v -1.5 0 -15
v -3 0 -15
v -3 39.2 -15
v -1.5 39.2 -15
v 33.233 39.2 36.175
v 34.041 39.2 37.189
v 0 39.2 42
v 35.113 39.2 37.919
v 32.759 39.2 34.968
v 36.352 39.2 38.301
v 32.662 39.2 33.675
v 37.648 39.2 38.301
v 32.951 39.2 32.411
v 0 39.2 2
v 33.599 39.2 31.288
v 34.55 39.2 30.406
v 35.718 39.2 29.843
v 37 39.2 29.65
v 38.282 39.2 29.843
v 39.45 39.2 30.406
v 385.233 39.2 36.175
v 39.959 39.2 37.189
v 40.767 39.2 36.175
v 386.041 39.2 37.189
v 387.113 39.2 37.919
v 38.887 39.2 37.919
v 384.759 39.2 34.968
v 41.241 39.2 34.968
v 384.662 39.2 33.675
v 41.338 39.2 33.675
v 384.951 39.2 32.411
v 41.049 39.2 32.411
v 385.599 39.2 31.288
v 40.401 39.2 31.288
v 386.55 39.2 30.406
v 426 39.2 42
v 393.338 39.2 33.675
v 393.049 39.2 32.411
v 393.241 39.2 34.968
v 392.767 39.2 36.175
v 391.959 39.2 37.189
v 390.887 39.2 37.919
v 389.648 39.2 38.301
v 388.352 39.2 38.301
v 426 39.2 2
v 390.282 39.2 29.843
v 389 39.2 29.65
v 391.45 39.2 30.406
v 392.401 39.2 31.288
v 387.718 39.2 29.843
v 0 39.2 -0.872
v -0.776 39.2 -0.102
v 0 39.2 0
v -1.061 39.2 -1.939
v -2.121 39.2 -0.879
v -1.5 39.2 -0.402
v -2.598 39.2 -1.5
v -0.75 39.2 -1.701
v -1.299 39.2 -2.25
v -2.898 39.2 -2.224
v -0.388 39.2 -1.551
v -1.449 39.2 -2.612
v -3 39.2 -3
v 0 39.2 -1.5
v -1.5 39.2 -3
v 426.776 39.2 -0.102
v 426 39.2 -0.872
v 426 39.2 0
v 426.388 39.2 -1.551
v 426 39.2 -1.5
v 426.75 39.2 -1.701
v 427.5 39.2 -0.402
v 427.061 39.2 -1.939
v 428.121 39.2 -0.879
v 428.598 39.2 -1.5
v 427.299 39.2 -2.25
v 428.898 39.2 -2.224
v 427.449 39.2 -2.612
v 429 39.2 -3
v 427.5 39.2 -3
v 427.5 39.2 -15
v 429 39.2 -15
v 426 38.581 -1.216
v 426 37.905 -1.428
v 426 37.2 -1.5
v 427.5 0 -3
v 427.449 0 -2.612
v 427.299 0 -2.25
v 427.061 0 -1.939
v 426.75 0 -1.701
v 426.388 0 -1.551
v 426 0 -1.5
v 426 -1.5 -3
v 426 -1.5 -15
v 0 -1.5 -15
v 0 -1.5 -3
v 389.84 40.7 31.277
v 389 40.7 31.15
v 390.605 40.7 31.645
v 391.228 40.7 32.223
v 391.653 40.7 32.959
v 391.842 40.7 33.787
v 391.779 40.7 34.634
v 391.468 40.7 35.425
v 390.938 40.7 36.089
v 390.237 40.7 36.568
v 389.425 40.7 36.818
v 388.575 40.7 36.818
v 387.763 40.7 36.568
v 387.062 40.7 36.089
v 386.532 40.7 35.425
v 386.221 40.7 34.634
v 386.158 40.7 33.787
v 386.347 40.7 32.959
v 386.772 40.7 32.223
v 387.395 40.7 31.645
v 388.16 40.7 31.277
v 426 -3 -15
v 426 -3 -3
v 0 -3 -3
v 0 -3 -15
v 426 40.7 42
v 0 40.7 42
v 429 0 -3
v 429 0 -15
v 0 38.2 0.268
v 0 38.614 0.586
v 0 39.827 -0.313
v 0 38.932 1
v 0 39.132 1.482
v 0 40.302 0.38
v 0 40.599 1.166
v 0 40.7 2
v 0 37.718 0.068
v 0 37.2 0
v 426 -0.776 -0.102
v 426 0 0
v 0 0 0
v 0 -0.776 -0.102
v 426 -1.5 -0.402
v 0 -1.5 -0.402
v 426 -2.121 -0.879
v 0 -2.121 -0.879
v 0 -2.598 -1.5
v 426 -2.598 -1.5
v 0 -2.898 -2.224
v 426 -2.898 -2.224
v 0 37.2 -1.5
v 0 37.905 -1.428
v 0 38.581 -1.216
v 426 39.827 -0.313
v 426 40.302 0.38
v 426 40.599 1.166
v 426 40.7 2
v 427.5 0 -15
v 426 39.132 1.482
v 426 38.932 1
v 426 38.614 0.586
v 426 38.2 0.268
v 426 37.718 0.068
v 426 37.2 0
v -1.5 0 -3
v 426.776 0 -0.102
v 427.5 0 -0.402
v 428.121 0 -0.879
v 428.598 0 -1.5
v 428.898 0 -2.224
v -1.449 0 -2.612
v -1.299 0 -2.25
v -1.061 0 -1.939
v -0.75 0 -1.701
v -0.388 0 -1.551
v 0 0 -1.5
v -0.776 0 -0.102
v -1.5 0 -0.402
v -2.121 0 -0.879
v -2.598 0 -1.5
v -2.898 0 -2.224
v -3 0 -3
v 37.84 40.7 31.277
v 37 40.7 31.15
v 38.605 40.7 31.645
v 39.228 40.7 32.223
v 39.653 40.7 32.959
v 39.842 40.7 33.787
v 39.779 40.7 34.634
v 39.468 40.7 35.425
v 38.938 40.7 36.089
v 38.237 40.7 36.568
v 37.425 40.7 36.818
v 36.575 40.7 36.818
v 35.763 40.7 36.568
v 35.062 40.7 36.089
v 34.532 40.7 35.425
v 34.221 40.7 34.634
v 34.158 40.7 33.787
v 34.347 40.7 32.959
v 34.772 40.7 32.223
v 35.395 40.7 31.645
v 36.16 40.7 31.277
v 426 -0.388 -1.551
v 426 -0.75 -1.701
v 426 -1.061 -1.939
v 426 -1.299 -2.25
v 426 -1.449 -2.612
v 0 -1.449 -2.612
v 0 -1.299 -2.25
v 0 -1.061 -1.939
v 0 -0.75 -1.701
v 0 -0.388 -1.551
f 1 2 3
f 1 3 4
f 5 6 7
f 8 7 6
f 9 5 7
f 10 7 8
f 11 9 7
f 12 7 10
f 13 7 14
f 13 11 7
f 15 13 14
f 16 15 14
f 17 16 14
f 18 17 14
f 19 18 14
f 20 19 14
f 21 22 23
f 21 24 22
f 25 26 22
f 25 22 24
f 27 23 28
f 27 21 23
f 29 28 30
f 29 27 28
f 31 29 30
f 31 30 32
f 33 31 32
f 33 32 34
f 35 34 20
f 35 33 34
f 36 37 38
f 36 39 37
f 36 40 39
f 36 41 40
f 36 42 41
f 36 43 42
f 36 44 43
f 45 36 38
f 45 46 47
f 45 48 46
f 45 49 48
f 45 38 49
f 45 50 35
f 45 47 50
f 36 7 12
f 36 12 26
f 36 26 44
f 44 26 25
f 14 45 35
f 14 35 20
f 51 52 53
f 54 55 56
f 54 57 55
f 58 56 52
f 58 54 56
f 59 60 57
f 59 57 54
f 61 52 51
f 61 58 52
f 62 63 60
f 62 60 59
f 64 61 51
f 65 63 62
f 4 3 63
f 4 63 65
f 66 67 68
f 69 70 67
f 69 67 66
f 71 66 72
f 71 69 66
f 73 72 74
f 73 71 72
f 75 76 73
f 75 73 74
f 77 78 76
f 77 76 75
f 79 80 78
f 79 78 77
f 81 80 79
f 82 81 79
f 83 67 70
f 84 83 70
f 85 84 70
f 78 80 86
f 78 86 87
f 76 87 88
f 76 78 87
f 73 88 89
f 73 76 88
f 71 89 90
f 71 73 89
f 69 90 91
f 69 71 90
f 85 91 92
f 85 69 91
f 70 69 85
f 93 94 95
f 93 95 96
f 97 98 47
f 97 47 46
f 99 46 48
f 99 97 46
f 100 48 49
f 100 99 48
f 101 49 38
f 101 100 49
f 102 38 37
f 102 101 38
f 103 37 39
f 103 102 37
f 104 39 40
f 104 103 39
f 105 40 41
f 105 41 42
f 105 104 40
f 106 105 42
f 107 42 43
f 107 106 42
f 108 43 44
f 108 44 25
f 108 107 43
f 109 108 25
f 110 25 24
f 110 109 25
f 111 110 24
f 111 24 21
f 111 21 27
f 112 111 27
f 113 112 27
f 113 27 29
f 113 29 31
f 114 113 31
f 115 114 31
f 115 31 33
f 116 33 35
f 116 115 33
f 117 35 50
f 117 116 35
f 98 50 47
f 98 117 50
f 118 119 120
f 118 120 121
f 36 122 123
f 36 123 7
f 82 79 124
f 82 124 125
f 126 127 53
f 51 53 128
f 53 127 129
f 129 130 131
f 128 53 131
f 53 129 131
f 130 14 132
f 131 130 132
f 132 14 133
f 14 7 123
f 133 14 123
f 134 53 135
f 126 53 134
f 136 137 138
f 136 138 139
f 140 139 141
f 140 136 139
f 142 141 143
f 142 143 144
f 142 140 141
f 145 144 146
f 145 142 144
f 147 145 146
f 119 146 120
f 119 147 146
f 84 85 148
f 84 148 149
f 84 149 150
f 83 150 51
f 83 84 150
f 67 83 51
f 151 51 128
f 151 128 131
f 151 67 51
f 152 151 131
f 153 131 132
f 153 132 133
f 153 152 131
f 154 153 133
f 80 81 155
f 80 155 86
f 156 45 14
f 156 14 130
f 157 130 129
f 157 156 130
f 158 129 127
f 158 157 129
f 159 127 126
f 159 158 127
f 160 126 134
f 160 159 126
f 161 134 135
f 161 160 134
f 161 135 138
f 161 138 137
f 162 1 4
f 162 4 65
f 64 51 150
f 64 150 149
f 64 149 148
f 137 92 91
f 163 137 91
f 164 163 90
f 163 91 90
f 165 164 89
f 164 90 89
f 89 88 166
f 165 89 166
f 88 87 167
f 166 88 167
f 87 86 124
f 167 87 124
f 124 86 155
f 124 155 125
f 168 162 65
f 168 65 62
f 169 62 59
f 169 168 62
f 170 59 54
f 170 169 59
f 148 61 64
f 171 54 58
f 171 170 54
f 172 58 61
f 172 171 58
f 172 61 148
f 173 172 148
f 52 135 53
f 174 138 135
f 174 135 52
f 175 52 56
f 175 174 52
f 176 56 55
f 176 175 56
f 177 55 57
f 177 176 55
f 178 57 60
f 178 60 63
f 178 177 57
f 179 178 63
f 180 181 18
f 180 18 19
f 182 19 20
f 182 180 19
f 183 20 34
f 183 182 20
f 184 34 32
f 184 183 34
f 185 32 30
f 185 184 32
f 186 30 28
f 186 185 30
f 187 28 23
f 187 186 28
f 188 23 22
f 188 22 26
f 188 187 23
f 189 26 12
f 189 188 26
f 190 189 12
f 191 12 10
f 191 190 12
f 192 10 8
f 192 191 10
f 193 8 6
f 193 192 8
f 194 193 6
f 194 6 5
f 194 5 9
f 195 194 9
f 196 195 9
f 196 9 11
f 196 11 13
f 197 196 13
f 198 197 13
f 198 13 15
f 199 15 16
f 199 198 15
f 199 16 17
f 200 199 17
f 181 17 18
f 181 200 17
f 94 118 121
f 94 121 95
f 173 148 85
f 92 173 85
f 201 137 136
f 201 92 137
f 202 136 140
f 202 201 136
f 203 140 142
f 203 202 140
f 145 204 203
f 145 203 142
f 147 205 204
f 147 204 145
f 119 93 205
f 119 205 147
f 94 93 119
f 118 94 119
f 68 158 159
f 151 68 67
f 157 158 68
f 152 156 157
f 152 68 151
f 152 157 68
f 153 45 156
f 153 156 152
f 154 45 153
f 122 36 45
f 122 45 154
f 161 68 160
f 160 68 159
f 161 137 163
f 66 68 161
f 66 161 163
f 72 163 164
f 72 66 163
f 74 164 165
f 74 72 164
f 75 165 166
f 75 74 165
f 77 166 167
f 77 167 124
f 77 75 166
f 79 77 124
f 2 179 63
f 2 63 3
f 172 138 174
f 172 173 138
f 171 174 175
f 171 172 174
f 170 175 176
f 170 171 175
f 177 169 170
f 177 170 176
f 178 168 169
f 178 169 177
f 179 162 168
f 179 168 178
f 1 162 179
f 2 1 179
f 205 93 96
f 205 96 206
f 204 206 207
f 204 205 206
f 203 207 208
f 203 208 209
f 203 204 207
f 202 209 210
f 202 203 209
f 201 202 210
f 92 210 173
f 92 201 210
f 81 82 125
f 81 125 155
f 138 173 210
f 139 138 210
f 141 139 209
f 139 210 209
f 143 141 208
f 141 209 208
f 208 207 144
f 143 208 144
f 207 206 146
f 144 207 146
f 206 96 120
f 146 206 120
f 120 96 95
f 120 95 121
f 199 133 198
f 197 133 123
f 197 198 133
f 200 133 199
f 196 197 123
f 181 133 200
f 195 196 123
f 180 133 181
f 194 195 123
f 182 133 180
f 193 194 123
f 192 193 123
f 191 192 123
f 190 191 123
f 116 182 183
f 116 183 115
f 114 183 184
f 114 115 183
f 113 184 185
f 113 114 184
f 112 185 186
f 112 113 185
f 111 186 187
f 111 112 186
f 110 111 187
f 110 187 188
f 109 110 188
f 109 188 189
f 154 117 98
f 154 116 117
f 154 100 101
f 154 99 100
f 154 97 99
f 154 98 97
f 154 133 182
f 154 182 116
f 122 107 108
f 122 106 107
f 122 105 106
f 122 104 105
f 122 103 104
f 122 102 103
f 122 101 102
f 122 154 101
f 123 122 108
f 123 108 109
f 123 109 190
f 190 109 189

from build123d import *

# Parameters (mm, degrees)
SKETCH_1_W                       = 426
SKETCH_1_H                       = 39.2
SM_BASE_FLANGE_1_DEPTH           = 1.5
SM_EDGE_FLANGE_2_DEPTH           = 39.2
SM_EDGE_FLANGE_3_DEPTH           = 426
SM_EDGE_FLANGE_4_DEPTH           = 39.2
SM_EDGE_FLANGE_5_STRIP_W         = 10
SM_EDGE_FLANGE_5_STRIP_H         = 1.5
SM_EDGE_FLANGE_5_STRIP_CUT_DEPTH = 426
SM_EDGE_FLANGE_5_DEPTH           = 426
SKETCH_28_R                      = 2.3
CUT_EXTRUDE_1_DEPTH              = 434.111810044
CHAMFER_1_SIZE                   = 2.05


# Sheet-metal steps are written as plain solids
with BuildPart() as part:
    # Sketch 1 → Базовая кромка1 (new body)
    with BuildSketch(Plane.XY):
        with Locations((213, 19.6)):
            Rectangle(SKETCH_1_W, SKETCH_1_H)
    extrude(amount=-SM_BASE_FLANGE_1_DEPTH)

    # Ребро-кромка2 section (across the edge) → Ребро-кромка2 (add)
    with BuildSketch(Plane(origin=(-1.5, 0, -1.5), x_dir=(1, 0, 0), z_dir=(0, 1, 0))):
        with BuildLine():
            Line((-1.5, 1.5), (-1.5, 13.5))
            Line((-1.5, 13.5), (0, 13.5))
            Line((0, 13.5), (0, 1.5))
            ThreePointArc((0, 1.5), (0.439339828, 0.439339828), (1.5, 0))
            Line((1.5, 0), (1.5, -1.5))
            ThreePointArc((1.5, -1.5), (-0.621320344, -0.621320344), (-1.5, 1.5))
        make_face()
    extrude(amount=SM_EDGE_FLANGE_2_DEPTH)

    # Ребро-кромка3 section (across the edge) → Ребро-кромка3 (add)
    with BuildSketch(Plane(origin=(426, -1.5, -1.5), x_dir=(0, 1, 0), z_dir=(-1, 0, 0))):
        with BuildLine():
            Line((-1.5, 1.5), (-1.5, 13.5))
            Line((-1.5, 13.5), (0, 13.5))
            Line((0, 13.5), (0, 1.5))
            ThreePointArc((0, 1.5), (0.439339828, 0.439339828), (1.5, 0))
            Line((1.5, 0), (1.5, -1.5))
            ThreePointArc((1.5, -1.5), (-0.621320344, -0.621320344), (-1.5, 1.5))
        make_face()
    extrude(amount=SM_EDGE_FLANGE_3_DEPTH)

    # Ребро-кромка4 section (across the edge) → Ребро-кромка4 (add)
    with BuildSketch(Plane(origin=(427.5, 39.2, -1.5), x_dir=(-1, 0, 0), z_dir=(0, -1, 0))):
        with BuildLine():
            Line((-1.5, 1.5), (-1.5, 13.5))
            Line((-1.5, 13.5), (0, 13.5))
            Line((0, 13.5), (0, 1.5))
            ThreePointArc((0, 1.5), (0.439339828, 0.439339828), (1.5, 0))
            Line((1.5, 0), (1.5, -1.5))
            ThreePointArc((1.5, -1.5), (-0.621320344, -0.621320344), (-1.5, 1.5))
        make_face()
    extrude(amount=SM_EDGE_FLANGE_4_DEPTH)

    # Ребро-кромка5 strip (across the edge) → Ребро-кромка5 strip cut (cut)
    with BuildSketch(Plane(origin=(426, 39.2, 0), x_dir=(0, -1, 0), z_dir=(-1, 0, 0))):
        with Locations((-3, -0.75)):
            Rectangle(SM_EDGE_FLANGE_5_STRIP_W, SM_EDGE_FLANGE_5_STRIP_H)
    extrude(amount=SM_EDGE_FLANGE_5_STRIP_CUT_DEPTH, mode=Mode.SUBTRACT)

    # Ребро-кромка5 section (across the edge) → Ребро-кромка5 (add)
    with BuildSketch(Plane(origin=(426, 39.2, 0), x_dir=(0, -1, 0), z_dir=(-1, 0, 0))):
        with BuildLine():
            Line((-1.5, 2), (-1.5, 42))
            Line((-1.5, 42), (0, 42))
            Line((0, 42), (0, 2))
            ThreePointArc((0, 2), (0.585786438, 0.585786438), (2, 0))
            Line((2, 0), (2, -1.5))
            ThreePointArc((2, -1.5), (-0.474873734, -0.474873734), (-1.5, 2))
        make_face()
    extrude(amount=SM_EDGE_FLANGE_5_DEPTH)

    # Эскиз28 → Вырез-Вытянуть1 (cut, through all)
    with BuildSketch(Plane.XZ.offset(-39.2)):
        with Locations(Location((37, 34, 0), (0, 0, 270))):
            Circle(SKETCH_28_R)
        with Locations(Location((389, 34, 0), (0, 0, 270))):
            Circle(SKETCH_28_R)
    extrude(amount=-CUT_EXTRUDE_1_DEPTH, mode=Mode.SUBTRACT)

    # Фаска1
    # the kernel refuses this chamfer: 2.05 mm, written as the material it takes off along each edge
    with BuildSketch(Plane(origin=(389, 39.2, 34), x_dir=(0, 0, -1), z_dir=(-1, 0, 0))) as chamfer_1_piece_1:
        Polygon((2.3 + CHAMFER_1_SIZE, 0), (2.3, -CHAMFER_1_SIZE), (2.3, 0), align=None)
    revolve(axis=Axis((389, 39.2, 34), (0, -1, 0)), mode=Mode.SUBTRACT)
    with BuildSketch(Plane(origin=(37, 39.2, 34), x_dir=(0, 0, -1), z_dir=(-1, 0, 0))) as chamfer_1_piece_2:
        Polygon((2.3 + CHAMFER_1_SIZE, 0), (2.3, -CHAMFER_1_SIZE), (2.3, 0), align=None)
    revolve(axis=Axis((37, 39.2, 34), (0, -1, 0)), mode=Mode.SUBTRACT)


solid = part.part
